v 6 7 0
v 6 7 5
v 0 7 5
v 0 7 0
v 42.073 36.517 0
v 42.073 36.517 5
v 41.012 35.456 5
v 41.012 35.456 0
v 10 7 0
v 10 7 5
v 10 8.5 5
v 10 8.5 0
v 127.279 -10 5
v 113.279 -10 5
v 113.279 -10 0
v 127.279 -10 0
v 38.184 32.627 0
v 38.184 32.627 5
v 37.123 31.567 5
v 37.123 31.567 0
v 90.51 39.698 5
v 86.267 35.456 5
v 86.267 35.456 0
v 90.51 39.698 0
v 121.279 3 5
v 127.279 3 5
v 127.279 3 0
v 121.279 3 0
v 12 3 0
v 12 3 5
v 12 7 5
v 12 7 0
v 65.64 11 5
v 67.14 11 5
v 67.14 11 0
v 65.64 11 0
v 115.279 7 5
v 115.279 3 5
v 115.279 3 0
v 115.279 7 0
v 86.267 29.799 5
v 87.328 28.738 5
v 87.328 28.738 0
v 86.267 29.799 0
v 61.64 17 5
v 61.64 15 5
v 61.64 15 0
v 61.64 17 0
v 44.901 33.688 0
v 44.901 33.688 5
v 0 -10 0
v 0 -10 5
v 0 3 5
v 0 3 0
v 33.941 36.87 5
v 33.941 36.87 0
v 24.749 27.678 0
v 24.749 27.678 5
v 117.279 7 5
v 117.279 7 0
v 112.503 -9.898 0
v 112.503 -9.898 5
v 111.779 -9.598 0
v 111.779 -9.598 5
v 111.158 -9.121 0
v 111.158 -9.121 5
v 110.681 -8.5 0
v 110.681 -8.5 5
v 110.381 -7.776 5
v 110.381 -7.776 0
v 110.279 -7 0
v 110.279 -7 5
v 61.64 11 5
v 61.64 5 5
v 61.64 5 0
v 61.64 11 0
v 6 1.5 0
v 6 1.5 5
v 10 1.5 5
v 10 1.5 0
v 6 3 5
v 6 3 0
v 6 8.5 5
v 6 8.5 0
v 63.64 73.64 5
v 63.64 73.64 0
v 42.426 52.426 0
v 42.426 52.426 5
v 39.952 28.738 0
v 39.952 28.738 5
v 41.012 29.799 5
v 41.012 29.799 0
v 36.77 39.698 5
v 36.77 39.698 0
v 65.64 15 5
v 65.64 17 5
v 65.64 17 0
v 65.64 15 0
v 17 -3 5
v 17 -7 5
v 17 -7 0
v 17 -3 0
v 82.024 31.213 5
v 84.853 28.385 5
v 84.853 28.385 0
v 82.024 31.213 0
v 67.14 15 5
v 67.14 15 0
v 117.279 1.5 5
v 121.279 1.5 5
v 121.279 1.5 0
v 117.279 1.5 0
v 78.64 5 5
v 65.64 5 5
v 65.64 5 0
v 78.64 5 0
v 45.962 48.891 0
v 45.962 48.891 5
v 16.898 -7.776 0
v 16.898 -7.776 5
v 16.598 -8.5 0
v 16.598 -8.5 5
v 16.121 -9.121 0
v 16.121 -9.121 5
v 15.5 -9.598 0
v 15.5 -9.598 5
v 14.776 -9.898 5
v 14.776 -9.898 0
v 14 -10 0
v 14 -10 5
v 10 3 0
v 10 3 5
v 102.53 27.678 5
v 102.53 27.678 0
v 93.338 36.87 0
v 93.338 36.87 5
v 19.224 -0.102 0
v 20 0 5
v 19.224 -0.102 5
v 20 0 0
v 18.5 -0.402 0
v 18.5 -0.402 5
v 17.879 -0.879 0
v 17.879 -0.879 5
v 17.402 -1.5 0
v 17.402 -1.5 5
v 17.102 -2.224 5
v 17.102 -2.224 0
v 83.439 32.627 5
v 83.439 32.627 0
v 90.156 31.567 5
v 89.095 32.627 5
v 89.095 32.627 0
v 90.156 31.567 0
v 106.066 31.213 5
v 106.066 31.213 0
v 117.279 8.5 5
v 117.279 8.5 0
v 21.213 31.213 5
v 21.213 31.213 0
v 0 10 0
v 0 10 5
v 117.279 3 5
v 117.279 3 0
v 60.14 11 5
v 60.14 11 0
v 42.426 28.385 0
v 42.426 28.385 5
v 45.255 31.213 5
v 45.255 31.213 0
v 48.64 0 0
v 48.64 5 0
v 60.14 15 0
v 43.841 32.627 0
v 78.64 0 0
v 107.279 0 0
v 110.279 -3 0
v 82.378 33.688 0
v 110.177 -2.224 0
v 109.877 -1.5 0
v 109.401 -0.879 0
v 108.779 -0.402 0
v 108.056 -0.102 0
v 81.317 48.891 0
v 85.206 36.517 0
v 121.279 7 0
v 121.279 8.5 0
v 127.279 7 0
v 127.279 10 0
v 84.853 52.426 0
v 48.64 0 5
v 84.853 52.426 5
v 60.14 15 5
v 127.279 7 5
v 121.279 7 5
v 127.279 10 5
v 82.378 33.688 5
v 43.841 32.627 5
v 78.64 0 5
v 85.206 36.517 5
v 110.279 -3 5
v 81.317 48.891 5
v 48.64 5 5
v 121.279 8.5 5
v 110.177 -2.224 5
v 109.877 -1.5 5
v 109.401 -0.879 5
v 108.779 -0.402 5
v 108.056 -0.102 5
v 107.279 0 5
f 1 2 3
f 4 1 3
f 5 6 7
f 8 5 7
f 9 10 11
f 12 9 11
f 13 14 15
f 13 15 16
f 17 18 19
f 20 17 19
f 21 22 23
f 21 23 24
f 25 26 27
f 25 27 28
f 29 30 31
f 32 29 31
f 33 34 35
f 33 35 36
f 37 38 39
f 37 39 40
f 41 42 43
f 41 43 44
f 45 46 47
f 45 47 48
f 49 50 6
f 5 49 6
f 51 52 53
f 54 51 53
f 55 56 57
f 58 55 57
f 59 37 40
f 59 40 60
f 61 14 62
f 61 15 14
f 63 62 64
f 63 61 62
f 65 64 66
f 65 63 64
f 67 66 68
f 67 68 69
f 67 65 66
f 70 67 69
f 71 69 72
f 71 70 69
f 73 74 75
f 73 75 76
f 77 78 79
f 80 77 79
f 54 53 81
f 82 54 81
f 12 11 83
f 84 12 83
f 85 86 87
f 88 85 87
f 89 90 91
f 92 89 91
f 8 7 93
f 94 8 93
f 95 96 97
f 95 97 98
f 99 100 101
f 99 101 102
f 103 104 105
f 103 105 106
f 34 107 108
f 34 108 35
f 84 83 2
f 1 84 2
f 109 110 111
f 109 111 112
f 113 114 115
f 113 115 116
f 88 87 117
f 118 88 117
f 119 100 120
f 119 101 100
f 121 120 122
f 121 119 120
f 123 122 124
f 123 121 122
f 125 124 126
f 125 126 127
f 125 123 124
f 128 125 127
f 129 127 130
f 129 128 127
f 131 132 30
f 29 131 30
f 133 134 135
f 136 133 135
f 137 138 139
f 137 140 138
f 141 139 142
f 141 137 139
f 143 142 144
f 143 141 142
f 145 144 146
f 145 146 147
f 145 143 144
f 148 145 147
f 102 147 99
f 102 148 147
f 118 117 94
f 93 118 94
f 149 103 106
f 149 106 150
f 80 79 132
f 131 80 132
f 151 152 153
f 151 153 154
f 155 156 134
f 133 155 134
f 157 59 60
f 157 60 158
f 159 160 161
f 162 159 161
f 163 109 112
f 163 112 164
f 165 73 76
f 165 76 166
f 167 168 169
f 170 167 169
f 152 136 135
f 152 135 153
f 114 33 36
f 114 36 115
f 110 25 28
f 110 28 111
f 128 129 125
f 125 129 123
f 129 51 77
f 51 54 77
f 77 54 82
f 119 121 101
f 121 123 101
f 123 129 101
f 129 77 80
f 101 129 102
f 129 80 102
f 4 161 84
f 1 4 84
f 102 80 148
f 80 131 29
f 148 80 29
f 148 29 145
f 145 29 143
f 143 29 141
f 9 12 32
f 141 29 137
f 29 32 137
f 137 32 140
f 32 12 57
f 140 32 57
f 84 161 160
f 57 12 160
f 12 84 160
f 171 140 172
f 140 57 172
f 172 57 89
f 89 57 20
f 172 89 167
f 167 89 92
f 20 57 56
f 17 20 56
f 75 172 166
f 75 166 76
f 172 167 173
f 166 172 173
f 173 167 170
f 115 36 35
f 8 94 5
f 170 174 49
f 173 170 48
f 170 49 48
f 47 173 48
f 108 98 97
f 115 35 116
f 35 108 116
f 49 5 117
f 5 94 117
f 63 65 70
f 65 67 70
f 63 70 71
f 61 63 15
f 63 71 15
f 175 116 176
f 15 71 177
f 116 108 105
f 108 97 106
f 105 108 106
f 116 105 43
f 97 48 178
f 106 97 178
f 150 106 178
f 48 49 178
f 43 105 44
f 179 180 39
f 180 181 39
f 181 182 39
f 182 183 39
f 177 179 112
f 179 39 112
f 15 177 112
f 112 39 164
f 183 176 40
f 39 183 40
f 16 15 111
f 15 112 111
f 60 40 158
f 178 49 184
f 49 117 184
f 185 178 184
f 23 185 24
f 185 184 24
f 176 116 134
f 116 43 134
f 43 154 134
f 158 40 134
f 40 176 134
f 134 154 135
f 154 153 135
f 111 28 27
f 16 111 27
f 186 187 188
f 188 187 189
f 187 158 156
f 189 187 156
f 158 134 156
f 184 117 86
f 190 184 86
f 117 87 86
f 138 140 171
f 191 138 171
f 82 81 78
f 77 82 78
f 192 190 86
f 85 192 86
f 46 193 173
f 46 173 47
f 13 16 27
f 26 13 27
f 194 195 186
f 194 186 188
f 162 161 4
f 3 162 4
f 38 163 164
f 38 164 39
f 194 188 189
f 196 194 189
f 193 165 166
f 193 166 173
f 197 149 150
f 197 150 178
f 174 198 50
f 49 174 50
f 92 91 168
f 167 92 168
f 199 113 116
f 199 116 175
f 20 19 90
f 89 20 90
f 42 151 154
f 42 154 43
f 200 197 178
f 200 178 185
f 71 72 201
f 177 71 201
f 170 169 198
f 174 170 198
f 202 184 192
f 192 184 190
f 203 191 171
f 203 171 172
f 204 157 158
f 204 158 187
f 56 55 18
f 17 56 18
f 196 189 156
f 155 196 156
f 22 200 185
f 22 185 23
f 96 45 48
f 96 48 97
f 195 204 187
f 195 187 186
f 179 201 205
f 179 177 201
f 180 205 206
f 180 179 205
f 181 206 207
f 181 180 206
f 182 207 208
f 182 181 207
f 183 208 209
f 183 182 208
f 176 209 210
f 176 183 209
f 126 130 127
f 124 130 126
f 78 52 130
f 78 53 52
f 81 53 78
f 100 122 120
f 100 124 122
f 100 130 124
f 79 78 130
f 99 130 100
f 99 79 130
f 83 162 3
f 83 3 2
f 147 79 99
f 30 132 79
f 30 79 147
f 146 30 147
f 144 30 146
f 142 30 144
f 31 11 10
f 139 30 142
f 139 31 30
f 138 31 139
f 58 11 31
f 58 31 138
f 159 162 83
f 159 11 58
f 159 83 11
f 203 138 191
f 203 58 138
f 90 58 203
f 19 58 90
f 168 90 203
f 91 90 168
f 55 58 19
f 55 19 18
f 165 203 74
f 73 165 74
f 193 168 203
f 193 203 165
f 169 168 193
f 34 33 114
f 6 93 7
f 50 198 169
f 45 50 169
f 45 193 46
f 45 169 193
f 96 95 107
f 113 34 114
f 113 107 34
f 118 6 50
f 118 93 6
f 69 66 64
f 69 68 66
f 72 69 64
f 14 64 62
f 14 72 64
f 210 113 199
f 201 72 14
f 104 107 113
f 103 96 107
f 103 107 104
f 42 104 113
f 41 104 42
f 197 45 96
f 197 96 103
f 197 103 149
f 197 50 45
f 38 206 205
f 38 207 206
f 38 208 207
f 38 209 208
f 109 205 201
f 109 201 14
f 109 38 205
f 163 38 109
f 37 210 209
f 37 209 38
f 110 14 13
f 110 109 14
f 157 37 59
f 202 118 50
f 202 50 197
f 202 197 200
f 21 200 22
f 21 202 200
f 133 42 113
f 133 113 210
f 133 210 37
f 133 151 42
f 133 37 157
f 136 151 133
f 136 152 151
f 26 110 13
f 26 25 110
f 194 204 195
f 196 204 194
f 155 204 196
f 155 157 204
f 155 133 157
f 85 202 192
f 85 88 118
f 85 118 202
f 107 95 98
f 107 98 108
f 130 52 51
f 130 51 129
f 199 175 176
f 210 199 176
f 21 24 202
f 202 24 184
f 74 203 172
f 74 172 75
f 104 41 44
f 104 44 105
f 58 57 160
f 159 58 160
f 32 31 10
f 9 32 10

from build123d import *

# Parameters (mm, degrees)
BOSS_EXTRUDE1_DEPTH = 5
CUT_EXTRUDE1_DEPTH  = 10
SKETCH4_W           = 17
SKETCH4_H           = 10
BOSS_EXTRUDE3_DEPTH = 5
FILLET1_R           = 3


with BuildPart() as part:
    # Sketch1 → Boss-Extrude1 (new body)
    with BuildSketch(Plane.XY):
        Polygon((0, 0), (127.279220614, 0), (127.279220614, 10), (106.066017178, 31.213203436), (102.530483272, 27.67766953), (81.317279836, 48.890872965), (84.852813742, 52.426406871), (63.639610307, 73.639610307), (42.426406871, 52.426406871), (45.961940777, 48.890872965), (24.748737342, 27.67766953), (21.213203436, 31.213203436), (0, 10), align=None)
    extrude(amount=BOSS_EXTRUDE1_DEPTH)

    # Sketch2 → Cut-Extrude1 (cut)
    with BuildSketch(Plane.XY.offset(5)):
        Polygon((127.279220614, 3), (121.279220614, 3), (121.279220614, 1.5), (117.279220614, 1.5), (117.279220614, 3), (115.279220614, 3), (115.279220614, 7), (117.279220614, 7), (117.279220614, 8.5), (121.279220614, 8.5), (121.279220614, 7), (127.279220614, 7), align=None)
        Polygon((36.769552622, 39.69848481), (33.941125497, 36.870057685), (38.183766184, 32.627416998), (37.123106012, 31.566756826), (39.951533137, 28.738329701), (41.012193309, 29.798989873), (42.426406871, 28.384776311), (45.254833996, 31.213203436), (43.840620434, 32.627416998), (44.901280605, 33.68807717), (42.072853481, 36.516504294), (41.012193309, 35.455844123), align=None)
        Polygon((0, 7), (0, 3), (6, 3), (6, 1.5), (10, 1.5), (10, 3), (12, 3), (12, 7), (10, 7), (10, 8.5), (6, 8.5), (6, 7), align=None)
        Polygon((48.639610307, 5), (61.639610307, 5), (61.639610307, 11), (60.139610307, 11), (60.139610307, 15), (61.639610307, 15), (61.639610307, 17), (65.639610307, 17), (65.639610307, 15), (67.139610307, 15), (67.139610307, 11), (65.639610307, 11), (65.639610307, 5), (78.639610307, 5), (78.639610307, 0), (48.639610307, 0), align=None)
        Polygon((93.338095117, 36.870057685), (89.09545443, 32.627416998), (90.156114601, 31.566756826), (87.327687477, 28.738329701), (86.267027305, 29.798989873), (84.852813742, 28.384776311), (82.024386618, 31.213203436), (83.43860018, 32.627416998), (82.377940008, 33.68807717), (85.206367133, 36.516504294), (86.267027305, 35.455844123), (90.509667992, 39.69848481), align=None)
    extrude(amount=-CUT_EXTRUDE1_DEPTH, mode=Mode.SUBTRACT)

    # Sketch4 → Boss-Extrude3 (add)
    with BuildSketch(Plane.XY.offset(5)):
        with Locations((8.5, -5)):
            Rectangle(SKETCH4_W, SKETCH4_H)
        with Locations((118.779220614, -5)):
            Rectangle(SKETCH4_W, SKETCH4_H)
    extrude(amount=-BOSS_EXTRUDE3_DEPTH)

    # Fillet1
    fillet1_edges = [part.edges().sort_by_distance(p)[0] for p in [
        (17, 0, 2.5),
        (17, -10, 2.5),
        (110.279220614, -10, 2.5),
        (110.279220614, 0, 2.5),
    ]]
    fillet(fillet1_edges, radius=FILLET1_R)


solid = part.part
